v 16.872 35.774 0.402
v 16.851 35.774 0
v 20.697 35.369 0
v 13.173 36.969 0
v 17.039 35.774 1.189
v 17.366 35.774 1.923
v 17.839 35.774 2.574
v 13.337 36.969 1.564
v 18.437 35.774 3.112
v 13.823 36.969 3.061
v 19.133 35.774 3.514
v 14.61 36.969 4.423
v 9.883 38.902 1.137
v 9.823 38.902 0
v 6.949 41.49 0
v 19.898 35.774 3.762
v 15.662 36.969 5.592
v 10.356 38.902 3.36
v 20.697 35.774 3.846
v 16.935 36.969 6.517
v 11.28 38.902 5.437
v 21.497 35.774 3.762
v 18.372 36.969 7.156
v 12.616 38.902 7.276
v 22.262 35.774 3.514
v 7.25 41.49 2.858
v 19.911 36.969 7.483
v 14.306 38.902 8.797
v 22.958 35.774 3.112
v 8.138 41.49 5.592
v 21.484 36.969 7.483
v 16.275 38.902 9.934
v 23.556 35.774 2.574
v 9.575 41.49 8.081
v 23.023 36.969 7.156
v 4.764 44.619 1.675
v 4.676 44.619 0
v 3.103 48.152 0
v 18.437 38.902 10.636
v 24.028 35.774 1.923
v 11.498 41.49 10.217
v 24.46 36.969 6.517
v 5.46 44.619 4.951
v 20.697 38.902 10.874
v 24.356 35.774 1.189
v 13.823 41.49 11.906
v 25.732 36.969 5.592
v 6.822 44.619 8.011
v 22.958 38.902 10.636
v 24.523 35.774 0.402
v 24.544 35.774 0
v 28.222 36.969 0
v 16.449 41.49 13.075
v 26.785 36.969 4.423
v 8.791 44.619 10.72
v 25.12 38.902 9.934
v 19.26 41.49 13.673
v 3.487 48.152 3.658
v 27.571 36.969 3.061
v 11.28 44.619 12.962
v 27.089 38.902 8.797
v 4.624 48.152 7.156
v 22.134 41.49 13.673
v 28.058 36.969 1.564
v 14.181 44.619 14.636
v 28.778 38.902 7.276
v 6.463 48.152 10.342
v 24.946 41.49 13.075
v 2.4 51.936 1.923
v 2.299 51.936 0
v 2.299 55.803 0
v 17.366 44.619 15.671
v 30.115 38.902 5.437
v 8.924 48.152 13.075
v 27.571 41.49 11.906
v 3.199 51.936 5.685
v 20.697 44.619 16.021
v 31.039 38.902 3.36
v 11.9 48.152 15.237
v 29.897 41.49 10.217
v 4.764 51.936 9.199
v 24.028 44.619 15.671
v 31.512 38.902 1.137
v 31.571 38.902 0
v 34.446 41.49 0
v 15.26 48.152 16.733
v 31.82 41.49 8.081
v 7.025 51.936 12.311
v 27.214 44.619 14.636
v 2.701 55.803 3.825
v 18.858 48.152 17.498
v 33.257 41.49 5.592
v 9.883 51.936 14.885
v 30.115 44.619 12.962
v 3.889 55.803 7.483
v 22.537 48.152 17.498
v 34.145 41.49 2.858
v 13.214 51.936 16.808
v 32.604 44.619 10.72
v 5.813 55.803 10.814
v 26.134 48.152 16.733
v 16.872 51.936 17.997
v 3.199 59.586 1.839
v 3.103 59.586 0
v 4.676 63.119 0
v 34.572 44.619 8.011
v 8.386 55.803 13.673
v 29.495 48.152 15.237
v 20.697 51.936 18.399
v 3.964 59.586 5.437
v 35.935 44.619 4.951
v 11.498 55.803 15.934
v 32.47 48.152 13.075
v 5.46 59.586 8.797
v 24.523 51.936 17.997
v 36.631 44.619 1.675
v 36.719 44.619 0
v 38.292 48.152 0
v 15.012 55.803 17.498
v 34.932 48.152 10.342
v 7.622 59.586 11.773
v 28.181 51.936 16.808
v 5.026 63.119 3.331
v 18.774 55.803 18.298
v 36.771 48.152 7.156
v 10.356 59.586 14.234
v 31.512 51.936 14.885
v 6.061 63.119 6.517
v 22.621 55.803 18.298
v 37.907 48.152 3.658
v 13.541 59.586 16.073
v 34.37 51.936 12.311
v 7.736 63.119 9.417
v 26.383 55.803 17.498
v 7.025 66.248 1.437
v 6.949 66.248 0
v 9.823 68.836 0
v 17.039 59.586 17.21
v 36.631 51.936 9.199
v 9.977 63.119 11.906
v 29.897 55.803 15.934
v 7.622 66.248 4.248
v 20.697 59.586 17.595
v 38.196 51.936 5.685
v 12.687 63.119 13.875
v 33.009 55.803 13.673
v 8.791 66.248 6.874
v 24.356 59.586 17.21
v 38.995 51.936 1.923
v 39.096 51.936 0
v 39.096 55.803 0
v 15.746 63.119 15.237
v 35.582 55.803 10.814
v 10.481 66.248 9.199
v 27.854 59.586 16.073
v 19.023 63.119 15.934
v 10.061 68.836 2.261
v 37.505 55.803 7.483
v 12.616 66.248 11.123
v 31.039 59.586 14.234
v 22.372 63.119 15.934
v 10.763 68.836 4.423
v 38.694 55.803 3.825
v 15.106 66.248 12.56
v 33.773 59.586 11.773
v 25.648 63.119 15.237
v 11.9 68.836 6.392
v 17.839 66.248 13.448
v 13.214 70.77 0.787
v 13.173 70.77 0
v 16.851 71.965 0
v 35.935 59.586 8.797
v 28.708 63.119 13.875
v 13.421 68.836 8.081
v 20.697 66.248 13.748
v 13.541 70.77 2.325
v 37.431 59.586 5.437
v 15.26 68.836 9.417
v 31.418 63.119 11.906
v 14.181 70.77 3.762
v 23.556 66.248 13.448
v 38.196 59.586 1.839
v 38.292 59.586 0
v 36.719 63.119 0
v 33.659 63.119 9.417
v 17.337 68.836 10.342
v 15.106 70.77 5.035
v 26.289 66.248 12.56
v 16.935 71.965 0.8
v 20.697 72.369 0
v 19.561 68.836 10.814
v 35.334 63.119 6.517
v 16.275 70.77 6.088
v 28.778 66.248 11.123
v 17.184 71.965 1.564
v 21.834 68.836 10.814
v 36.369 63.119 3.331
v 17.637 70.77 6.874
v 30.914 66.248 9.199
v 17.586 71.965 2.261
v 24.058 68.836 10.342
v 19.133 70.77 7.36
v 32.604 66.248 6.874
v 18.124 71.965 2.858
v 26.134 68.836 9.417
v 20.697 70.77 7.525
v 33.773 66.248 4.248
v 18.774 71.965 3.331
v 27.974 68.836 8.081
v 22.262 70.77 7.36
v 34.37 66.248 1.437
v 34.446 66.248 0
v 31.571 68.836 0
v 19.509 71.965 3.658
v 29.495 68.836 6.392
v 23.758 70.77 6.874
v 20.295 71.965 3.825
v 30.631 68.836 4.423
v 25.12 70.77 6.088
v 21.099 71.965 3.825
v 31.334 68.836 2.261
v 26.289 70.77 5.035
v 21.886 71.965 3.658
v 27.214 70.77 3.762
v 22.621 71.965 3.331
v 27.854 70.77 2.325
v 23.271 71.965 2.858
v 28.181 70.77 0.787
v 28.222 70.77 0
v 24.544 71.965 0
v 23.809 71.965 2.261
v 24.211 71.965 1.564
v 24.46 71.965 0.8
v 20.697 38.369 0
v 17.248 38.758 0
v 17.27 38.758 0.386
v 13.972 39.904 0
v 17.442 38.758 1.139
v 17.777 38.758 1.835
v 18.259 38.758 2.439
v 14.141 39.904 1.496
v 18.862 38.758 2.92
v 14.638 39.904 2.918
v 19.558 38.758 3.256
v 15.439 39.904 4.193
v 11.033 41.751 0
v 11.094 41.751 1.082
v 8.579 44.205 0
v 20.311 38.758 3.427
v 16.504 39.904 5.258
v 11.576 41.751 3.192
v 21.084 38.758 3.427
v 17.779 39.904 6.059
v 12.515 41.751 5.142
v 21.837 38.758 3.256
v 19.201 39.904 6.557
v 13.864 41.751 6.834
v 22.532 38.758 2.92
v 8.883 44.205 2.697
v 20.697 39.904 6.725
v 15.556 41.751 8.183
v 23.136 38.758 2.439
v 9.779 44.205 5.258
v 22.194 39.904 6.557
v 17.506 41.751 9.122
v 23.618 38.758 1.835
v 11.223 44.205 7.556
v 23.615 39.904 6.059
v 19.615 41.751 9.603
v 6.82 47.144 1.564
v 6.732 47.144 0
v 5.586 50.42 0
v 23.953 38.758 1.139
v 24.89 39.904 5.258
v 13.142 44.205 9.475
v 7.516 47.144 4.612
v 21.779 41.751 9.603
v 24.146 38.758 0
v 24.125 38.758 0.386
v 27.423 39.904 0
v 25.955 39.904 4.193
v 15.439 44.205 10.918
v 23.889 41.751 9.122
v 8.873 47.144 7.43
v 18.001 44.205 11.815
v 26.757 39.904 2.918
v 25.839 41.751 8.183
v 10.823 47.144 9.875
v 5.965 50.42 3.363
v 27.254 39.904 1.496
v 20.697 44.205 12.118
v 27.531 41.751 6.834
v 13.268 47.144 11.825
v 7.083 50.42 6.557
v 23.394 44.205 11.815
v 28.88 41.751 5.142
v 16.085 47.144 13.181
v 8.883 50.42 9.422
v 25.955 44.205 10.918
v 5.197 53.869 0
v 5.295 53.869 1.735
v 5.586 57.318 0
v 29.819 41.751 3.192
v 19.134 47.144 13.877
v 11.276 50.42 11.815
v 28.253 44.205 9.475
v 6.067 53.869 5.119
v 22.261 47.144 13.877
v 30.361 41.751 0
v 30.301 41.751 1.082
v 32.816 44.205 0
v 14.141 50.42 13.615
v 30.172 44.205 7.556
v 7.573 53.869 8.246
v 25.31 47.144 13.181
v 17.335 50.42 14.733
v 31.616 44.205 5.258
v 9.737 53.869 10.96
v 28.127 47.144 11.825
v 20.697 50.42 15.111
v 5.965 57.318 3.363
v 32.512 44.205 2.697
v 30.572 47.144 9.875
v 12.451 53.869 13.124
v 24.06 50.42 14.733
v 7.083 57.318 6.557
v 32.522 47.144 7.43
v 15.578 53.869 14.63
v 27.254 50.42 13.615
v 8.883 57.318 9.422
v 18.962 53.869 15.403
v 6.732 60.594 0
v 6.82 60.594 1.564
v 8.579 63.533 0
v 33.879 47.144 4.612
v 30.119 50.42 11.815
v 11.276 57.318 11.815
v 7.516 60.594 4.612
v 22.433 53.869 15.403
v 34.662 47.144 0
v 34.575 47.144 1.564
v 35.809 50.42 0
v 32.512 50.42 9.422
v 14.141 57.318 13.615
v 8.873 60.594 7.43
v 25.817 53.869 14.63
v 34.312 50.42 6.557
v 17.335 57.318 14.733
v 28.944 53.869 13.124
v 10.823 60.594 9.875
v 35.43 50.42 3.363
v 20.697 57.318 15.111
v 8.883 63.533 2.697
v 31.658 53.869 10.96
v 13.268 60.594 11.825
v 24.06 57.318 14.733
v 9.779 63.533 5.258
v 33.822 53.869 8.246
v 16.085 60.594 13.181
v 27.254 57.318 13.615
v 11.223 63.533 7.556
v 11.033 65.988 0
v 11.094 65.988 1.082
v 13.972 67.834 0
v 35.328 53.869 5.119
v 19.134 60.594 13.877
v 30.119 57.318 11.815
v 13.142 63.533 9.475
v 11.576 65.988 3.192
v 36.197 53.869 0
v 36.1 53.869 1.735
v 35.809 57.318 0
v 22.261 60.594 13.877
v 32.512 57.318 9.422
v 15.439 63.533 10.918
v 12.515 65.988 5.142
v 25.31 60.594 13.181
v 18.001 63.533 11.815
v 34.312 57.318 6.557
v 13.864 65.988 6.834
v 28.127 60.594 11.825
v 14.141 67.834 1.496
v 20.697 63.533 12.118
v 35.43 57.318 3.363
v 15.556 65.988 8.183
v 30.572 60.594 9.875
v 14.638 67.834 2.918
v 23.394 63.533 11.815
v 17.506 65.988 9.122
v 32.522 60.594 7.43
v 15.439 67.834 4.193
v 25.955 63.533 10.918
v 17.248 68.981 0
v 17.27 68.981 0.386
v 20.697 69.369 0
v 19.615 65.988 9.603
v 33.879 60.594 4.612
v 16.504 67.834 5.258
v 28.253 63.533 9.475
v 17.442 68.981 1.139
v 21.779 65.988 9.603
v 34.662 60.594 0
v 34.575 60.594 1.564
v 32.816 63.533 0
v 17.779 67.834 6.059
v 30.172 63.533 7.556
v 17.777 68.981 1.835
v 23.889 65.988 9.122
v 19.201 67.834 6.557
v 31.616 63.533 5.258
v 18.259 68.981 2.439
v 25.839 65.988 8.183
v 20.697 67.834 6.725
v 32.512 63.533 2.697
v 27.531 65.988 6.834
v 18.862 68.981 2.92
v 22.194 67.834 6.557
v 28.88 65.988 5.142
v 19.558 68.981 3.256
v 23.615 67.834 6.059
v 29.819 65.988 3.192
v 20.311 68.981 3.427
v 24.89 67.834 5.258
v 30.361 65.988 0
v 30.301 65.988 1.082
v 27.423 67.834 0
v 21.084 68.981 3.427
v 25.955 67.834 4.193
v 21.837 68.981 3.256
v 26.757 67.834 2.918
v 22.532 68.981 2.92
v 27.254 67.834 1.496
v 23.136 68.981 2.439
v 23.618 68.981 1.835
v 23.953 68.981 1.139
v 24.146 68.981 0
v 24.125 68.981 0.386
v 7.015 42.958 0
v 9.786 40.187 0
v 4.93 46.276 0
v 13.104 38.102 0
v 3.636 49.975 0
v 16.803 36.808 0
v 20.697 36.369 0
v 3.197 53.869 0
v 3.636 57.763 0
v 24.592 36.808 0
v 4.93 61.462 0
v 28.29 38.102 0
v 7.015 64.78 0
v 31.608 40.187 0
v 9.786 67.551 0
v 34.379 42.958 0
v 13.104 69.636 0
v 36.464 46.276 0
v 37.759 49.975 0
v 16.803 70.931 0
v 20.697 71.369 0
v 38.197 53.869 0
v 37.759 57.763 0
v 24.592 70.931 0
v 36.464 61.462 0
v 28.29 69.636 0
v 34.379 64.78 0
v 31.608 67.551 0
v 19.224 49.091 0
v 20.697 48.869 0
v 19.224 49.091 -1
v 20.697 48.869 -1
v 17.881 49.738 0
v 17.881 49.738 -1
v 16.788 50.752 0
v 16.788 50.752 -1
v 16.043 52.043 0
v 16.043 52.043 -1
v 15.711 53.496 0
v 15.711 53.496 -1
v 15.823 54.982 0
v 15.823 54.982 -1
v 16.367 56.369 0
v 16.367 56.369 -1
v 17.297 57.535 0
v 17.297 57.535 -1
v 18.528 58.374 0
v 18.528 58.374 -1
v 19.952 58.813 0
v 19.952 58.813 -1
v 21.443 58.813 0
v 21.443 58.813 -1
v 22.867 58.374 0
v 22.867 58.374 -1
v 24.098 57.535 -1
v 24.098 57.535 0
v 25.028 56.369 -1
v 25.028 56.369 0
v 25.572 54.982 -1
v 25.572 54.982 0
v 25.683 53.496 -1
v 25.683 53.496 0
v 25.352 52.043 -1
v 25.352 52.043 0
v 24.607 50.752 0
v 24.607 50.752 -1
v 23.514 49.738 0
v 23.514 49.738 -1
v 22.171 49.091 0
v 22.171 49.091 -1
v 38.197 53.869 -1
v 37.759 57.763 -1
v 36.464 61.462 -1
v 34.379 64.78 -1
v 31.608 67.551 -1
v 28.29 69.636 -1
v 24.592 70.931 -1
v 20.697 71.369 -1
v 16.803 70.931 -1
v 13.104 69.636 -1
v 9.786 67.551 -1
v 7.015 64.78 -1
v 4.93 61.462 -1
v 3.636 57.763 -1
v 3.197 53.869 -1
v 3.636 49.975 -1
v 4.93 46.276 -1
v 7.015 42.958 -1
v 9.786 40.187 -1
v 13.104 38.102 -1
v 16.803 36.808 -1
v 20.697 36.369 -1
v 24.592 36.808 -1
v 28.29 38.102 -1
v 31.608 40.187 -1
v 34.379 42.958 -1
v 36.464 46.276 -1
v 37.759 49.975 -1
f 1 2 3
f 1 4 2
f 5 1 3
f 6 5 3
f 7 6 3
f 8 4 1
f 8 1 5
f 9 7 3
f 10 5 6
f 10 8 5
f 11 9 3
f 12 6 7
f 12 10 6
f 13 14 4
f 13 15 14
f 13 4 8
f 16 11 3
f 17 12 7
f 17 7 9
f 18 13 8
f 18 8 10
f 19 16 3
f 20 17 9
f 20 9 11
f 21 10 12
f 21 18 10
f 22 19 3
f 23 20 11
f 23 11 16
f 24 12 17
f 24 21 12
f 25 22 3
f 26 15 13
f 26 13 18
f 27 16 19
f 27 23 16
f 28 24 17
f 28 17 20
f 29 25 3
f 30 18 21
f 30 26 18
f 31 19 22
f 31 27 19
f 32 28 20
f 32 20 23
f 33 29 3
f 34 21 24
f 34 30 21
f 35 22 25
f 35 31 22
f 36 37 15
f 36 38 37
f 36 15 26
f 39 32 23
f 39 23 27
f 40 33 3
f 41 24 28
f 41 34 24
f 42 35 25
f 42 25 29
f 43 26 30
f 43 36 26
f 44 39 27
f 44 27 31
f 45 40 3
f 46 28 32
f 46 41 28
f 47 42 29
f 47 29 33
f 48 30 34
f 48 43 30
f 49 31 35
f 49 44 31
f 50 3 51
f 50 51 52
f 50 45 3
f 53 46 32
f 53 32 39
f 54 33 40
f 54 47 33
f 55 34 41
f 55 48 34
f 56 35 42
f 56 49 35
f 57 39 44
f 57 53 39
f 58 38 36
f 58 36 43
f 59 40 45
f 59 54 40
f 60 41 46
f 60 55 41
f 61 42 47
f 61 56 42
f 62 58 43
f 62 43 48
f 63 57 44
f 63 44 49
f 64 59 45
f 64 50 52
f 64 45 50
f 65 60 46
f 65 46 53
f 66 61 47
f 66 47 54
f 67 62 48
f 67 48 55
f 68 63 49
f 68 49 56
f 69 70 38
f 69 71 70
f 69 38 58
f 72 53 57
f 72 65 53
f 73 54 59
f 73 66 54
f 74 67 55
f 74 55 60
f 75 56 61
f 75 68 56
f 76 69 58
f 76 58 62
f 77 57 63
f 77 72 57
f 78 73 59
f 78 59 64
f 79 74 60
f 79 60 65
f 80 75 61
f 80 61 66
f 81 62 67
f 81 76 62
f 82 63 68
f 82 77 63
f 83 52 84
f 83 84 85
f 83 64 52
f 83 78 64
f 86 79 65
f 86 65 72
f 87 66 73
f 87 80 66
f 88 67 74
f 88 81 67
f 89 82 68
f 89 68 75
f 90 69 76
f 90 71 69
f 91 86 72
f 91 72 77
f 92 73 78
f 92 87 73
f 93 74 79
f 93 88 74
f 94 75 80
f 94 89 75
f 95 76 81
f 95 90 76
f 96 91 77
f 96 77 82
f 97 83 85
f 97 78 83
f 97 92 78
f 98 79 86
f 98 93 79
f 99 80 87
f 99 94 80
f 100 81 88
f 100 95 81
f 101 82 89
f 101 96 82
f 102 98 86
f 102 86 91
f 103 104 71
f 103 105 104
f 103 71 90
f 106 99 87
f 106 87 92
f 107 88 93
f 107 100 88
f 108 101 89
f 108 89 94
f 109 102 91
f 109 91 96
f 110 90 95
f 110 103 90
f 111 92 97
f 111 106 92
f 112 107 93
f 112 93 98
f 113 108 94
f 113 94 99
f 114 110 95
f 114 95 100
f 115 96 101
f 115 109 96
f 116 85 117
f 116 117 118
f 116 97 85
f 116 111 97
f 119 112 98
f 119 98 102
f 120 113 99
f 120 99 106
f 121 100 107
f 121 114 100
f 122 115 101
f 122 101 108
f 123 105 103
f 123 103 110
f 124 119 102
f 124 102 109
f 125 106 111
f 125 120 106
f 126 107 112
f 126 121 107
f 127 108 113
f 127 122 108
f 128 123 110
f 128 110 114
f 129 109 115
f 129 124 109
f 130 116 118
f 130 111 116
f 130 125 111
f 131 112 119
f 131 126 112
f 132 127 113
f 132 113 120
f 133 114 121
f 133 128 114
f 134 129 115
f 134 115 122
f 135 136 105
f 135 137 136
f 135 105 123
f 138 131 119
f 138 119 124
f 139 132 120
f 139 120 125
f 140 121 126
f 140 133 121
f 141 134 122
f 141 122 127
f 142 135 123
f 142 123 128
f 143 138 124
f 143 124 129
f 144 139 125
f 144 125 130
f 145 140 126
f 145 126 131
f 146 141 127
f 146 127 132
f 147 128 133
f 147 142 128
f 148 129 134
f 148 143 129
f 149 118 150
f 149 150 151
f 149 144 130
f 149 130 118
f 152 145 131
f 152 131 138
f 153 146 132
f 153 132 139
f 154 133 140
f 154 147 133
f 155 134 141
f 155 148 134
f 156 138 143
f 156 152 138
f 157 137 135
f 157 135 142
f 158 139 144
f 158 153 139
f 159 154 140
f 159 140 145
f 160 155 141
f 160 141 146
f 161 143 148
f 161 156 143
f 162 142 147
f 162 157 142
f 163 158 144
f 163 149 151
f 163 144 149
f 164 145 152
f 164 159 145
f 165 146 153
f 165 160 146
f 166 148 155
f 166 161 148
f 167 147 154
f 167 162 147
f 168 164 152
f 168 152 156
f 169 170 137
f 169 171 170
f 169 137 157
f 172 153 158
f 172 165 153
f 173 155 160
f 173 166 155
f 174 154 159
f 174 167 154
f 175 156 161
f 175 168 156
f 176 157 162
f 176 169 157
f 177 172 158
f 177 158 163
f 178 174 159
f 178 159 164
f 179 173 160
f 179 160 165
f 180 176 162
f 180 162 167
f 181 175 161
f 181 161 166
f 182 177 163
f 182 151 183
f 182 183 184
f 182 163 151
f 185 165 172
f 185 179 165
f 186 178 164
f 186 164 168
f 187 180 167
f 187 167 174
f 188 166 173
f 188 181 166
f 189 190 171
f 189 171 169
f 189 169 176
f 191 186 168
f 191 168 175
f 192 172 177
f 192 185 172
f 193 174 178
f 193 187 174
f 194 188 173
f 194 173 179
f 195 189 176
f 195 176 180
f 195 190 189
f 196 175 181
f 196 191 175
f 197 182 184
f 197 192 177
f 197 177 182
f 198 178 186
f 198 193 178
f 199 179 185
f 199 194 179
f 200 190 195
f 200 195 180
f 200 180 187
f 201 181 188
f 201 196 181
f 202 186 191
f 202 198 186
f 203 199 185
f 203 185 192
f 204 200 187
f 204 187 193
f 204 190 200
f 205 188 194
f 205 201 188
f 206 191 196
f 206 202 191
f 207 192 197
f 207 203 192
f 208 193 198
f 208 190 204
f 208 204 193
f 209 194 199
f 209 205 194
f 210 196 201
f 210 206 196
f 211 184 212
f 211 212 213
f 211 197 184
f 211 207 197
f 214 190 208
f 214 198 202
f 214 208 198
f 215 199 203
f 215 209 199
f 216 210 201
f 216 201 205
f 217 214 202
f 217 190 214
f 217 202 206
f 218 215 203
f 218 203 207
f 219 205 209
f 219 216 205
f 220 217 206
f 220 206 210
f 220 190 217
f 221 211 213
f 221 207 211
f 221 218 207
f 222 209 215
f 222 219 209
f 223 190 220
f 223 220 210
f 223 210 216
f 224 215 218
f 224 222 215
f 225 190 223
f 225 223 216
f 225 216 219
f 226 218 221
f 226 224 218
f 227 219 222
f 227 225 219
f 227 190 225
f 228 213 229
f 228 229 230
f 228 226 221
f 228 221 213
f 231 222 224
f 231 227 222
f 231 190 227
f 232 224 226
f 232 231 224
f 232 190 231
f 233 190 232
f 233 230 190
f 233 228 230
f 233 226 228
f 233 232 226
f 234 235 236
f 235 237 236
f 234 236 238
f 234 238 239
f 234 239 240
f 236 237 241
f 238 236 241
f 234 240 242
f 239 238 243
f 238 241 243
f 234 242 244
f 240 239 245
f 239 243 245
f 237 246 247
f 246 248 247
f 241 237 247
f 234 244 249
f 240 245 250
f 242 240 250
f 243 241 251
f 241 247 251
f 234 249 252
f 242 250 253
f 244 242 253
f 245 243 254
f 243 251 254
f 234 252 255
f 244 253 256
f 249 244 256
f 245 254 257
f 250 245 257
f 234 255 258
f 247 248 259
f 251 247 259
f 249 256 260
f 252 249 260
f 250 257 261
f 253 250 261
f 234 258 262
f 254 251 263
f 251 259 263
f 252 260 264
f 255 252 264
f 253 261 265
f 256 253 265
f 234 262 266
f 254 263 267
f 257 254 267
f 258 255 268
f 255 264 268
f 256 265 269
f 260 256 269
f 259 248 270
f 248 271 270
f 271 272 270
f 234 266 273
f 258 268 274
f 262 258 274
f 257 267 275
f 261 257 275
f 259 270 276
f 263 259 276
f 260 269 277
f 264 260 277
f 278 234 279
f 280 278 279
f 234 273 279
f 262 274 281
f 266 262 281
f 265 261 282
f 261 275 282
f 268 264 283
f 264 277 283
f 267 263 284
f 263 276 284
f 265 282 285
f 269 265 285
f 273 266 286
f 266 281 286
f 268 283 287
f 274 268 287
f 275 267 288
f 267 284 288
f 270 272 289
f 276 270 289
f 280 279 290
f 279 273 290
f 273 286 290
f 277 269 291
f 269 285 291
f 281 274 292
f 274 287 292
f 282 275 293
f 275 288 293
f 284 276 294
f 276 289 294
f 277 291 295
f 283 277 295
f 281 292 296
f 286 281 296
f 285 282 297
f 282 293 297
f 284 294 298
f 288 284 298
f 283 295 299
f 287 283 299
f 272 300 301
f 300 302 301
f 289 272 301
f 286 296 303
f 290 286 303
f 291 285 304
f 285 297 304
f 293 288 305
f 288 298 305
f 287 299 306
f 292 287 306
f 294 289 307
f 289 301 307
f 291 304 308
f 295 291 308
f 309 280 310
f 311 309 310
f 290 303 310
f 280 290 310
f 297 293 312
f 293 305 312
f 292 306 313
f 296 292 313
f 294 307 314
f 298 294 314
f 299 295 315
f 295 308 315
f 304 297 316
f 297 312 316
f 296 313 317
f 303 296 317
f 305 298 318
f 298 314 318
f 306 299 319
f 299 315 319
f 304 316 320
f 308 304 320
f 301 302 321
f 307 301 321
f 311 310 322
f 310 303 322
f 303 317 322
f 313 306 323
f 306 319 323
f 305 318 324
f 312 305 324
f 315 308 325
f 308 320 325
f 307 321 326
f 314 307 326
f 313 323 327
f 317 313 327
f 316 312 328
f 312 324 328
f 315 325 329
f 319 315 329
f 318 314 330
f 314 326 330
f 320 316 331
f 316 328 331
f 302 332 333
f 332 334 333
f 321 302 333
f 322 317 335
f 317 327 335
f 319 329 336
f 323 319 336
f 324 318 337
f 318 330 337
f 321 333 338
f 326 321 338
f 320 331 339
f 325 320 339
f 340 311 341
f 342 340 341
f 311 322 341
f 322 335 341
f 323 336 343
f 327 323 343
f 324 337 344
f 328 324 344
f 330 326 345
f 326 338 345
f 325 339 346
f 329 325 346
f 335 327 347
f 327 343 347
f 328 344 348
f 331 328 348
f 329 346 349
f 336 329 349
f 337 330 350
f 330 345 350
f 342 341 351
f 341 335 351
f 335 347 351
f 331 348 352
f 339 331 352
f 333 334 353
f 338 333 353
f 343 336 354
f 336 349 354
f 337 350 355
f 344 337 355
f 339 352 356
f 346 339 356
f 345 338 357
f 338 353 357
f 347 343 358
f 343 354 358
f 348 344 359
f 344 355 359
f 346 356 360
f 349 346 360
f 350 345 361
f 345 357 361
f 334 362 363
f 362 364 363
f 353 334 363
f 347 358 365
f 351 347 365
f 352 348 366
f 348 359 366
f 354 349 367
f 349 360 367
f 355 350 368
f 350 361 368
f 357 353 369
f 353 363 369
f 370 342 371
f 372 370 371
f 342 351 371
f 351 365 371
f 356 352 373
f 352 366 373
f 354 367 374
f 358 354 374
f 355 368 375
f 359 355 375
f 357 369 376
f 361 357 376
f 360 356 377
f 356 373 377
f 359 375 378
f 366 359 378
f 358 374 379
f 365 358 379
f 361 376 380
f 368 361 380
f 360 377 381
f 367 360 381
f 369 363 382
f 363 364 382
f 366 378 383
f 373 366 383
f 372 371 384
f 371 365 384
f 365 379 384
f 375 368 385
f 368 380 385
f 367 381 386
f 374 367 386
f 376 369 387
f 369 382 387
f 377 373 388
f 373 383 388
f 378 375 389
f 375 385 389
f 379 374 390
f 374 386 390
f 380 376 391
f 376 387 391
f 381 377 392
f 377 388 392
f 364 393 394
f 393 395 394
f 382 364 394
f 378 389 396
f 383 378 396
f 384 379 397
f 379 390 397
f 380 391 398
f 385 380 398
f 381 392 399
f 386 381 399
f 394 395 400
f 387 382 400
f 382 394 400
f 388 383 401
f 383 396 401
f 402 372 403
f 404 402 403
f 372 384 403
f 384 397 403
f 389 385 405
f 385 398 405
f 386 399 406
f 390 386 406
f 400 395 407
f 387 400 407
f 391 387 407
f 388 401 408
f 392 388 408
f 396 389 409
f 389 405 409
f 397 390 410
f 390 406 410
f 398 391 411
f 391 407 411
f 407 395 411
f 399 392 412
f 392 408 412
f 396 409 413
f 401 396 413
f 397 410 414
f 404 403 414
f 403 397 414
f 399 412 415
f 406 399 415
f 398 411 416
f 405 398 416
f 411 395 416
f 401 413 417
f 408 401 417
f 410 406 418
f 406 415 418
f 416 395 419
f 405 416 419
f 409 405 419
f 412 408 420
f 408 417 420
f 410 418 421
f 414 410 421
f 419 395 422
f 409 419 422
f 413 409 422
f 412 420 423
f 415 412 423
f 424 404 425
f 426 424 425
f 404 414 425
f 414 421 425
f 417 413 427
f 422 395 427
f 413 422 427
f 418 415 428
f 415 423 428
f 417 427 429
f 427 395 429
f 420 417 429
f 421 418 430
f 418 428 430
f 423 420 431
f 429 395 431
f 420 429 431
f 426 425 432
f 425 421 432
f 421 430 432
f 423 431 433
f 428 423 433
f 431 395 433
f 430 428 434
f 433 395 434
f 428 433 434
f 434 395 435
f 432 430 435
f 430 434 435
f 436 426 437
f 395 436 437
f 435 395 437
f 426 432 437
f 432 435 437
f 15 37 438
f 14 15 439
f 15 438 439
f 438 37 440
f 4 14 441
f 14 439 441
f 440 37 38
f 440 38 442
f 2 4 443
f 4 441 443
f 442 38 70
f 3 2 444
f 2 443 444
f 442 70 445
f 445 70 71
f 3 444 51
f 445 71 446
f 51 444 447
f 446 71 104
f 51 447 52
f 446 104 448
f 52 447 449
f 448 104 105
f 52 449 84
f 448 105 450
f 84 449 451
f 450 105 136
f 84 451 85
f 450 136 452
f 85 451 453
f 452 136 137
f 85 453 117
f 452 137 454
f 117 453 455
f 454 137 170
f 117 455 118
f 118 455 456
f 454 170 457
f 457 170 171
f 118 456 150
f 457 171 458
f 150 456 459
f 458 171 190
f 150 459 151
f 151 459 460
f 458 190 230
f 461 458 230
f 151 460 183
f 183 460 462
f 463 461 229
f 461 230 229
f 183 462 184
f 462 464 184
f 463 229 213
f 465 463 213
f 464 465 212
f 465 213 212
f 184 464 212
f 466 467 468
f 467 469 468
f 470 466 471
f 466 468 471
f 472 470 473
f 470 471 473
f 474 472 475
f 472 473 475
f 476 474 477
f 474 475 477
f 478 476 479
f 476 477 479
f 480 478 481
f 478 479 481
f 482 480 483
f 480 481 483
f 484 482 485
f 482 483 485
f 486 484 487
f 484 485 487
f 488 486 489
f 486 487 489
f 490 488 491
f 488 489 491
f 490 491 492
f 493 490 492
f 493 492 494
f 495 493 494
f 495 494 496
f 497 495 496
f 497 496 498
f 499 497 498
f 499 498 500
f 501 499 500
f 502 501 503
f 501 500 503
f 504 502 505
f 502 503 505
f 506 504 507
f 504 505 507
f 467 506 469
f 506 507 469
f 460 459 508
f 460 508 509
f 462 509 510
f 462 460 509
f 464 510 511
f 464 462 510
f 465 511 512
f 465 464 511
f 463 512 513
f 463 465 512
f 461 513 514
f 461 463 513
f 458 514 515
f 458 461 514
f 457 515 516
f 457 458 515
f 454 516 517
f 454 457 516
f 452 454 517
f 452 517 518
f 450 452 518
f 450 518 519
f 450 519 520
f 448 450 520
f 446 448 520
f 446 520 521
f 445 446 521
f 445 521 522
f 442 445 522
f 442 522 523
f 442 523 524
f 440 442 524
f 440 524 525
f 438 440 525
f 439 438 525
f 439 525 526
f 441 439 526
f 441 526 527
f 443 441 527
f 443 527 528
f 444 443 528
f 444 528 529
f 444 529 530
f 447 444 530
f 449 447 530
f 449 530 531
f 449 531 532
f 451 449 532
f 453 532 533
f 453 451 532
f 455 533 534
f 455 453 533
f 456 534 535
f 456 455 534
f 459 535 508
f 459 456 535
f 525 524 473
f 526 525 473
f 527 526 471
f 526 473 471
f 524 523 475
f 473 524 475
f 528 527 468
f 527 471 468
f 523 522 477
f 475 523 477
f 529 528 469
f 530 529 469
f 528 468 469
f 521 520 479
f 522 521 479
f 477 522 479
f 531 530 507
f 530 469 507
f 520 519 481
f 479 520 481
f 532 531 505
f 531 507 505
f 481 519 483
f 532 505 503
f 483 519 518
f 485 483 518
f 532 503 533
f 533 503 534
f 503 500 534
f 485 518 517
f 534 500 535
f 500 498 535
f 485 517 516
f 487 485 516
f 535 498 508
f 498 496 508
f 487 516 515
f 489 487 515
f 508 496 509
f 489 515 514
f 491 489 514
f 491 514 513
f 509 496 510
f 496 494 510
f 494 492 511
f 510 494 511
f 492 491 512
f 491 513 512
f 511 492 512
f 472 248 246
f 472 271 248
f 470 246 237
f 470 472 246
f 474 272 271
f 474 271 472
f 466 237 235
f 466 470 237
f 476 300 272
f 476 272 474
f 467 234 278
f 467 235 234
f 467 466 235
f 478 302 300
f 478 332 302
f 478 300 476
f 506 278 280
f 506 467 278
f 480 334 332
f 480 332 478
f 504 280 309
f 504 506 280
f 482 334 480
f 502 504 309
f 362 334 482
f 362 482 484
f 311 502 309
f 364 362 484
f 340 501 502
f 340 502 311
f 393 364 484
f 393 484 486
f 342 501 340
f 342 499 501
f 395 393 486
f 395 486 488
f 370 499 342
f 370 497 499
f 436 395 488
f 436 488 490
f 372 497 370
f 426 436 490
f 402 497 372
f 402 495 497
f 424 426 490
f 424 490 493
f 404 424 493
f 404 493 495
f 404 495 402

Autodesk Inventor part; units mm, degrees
ref_plane "YZ Plane" through (0, 0, 0) normal (1, 0, 0) x (0, 1, 0)
ref_plane "XZ Plane" through (0, 0, 0) normal (0, 1, 0) x (-1, 0, 0)
ref_plane "XY Plane" through (0, 0, 0) normal (0, 0, 1) x (1, 0, 0)
sketch "Sketch1" plane through (0, 0, 0) normal (0, 0, 1) x (1, 0, 0)
  arc A0 (20.6974, 35.3693) -> (20.6974, 72.3693) centre (20.6974, 53.8693) ccw
  line L0 (20.6974, 72.3693) -> (20.6974, 35.3693)
  circle A1 centre (20.6974, 53.8693) radius 17.5
  point P0 (0, 0)
  dimension "d0" = 37
  dimension "d2" = 35
revolve "Revolution1" add sketch "Sketch1" angle 180 about axis through (20.6974, 72.3693, 0) along (0, -1, 0) picked at (29.7821, 55.9689) contours L0 A1 A0 | L0 A1
shell "Shell2" thickness 3 removed faces 1 at (14.9315, 56.056, 0)
extrude "Extrusion3" add sketch "Sketch1" against normal blind 1 contours A1 L0 | L0 A1
hole "Hole3" at (20.6974, 53.8693, 0) direction (0, 0, -1) diameter 10 depth 1
properties part number "kaca" material "Polycarbonate, Clear"
